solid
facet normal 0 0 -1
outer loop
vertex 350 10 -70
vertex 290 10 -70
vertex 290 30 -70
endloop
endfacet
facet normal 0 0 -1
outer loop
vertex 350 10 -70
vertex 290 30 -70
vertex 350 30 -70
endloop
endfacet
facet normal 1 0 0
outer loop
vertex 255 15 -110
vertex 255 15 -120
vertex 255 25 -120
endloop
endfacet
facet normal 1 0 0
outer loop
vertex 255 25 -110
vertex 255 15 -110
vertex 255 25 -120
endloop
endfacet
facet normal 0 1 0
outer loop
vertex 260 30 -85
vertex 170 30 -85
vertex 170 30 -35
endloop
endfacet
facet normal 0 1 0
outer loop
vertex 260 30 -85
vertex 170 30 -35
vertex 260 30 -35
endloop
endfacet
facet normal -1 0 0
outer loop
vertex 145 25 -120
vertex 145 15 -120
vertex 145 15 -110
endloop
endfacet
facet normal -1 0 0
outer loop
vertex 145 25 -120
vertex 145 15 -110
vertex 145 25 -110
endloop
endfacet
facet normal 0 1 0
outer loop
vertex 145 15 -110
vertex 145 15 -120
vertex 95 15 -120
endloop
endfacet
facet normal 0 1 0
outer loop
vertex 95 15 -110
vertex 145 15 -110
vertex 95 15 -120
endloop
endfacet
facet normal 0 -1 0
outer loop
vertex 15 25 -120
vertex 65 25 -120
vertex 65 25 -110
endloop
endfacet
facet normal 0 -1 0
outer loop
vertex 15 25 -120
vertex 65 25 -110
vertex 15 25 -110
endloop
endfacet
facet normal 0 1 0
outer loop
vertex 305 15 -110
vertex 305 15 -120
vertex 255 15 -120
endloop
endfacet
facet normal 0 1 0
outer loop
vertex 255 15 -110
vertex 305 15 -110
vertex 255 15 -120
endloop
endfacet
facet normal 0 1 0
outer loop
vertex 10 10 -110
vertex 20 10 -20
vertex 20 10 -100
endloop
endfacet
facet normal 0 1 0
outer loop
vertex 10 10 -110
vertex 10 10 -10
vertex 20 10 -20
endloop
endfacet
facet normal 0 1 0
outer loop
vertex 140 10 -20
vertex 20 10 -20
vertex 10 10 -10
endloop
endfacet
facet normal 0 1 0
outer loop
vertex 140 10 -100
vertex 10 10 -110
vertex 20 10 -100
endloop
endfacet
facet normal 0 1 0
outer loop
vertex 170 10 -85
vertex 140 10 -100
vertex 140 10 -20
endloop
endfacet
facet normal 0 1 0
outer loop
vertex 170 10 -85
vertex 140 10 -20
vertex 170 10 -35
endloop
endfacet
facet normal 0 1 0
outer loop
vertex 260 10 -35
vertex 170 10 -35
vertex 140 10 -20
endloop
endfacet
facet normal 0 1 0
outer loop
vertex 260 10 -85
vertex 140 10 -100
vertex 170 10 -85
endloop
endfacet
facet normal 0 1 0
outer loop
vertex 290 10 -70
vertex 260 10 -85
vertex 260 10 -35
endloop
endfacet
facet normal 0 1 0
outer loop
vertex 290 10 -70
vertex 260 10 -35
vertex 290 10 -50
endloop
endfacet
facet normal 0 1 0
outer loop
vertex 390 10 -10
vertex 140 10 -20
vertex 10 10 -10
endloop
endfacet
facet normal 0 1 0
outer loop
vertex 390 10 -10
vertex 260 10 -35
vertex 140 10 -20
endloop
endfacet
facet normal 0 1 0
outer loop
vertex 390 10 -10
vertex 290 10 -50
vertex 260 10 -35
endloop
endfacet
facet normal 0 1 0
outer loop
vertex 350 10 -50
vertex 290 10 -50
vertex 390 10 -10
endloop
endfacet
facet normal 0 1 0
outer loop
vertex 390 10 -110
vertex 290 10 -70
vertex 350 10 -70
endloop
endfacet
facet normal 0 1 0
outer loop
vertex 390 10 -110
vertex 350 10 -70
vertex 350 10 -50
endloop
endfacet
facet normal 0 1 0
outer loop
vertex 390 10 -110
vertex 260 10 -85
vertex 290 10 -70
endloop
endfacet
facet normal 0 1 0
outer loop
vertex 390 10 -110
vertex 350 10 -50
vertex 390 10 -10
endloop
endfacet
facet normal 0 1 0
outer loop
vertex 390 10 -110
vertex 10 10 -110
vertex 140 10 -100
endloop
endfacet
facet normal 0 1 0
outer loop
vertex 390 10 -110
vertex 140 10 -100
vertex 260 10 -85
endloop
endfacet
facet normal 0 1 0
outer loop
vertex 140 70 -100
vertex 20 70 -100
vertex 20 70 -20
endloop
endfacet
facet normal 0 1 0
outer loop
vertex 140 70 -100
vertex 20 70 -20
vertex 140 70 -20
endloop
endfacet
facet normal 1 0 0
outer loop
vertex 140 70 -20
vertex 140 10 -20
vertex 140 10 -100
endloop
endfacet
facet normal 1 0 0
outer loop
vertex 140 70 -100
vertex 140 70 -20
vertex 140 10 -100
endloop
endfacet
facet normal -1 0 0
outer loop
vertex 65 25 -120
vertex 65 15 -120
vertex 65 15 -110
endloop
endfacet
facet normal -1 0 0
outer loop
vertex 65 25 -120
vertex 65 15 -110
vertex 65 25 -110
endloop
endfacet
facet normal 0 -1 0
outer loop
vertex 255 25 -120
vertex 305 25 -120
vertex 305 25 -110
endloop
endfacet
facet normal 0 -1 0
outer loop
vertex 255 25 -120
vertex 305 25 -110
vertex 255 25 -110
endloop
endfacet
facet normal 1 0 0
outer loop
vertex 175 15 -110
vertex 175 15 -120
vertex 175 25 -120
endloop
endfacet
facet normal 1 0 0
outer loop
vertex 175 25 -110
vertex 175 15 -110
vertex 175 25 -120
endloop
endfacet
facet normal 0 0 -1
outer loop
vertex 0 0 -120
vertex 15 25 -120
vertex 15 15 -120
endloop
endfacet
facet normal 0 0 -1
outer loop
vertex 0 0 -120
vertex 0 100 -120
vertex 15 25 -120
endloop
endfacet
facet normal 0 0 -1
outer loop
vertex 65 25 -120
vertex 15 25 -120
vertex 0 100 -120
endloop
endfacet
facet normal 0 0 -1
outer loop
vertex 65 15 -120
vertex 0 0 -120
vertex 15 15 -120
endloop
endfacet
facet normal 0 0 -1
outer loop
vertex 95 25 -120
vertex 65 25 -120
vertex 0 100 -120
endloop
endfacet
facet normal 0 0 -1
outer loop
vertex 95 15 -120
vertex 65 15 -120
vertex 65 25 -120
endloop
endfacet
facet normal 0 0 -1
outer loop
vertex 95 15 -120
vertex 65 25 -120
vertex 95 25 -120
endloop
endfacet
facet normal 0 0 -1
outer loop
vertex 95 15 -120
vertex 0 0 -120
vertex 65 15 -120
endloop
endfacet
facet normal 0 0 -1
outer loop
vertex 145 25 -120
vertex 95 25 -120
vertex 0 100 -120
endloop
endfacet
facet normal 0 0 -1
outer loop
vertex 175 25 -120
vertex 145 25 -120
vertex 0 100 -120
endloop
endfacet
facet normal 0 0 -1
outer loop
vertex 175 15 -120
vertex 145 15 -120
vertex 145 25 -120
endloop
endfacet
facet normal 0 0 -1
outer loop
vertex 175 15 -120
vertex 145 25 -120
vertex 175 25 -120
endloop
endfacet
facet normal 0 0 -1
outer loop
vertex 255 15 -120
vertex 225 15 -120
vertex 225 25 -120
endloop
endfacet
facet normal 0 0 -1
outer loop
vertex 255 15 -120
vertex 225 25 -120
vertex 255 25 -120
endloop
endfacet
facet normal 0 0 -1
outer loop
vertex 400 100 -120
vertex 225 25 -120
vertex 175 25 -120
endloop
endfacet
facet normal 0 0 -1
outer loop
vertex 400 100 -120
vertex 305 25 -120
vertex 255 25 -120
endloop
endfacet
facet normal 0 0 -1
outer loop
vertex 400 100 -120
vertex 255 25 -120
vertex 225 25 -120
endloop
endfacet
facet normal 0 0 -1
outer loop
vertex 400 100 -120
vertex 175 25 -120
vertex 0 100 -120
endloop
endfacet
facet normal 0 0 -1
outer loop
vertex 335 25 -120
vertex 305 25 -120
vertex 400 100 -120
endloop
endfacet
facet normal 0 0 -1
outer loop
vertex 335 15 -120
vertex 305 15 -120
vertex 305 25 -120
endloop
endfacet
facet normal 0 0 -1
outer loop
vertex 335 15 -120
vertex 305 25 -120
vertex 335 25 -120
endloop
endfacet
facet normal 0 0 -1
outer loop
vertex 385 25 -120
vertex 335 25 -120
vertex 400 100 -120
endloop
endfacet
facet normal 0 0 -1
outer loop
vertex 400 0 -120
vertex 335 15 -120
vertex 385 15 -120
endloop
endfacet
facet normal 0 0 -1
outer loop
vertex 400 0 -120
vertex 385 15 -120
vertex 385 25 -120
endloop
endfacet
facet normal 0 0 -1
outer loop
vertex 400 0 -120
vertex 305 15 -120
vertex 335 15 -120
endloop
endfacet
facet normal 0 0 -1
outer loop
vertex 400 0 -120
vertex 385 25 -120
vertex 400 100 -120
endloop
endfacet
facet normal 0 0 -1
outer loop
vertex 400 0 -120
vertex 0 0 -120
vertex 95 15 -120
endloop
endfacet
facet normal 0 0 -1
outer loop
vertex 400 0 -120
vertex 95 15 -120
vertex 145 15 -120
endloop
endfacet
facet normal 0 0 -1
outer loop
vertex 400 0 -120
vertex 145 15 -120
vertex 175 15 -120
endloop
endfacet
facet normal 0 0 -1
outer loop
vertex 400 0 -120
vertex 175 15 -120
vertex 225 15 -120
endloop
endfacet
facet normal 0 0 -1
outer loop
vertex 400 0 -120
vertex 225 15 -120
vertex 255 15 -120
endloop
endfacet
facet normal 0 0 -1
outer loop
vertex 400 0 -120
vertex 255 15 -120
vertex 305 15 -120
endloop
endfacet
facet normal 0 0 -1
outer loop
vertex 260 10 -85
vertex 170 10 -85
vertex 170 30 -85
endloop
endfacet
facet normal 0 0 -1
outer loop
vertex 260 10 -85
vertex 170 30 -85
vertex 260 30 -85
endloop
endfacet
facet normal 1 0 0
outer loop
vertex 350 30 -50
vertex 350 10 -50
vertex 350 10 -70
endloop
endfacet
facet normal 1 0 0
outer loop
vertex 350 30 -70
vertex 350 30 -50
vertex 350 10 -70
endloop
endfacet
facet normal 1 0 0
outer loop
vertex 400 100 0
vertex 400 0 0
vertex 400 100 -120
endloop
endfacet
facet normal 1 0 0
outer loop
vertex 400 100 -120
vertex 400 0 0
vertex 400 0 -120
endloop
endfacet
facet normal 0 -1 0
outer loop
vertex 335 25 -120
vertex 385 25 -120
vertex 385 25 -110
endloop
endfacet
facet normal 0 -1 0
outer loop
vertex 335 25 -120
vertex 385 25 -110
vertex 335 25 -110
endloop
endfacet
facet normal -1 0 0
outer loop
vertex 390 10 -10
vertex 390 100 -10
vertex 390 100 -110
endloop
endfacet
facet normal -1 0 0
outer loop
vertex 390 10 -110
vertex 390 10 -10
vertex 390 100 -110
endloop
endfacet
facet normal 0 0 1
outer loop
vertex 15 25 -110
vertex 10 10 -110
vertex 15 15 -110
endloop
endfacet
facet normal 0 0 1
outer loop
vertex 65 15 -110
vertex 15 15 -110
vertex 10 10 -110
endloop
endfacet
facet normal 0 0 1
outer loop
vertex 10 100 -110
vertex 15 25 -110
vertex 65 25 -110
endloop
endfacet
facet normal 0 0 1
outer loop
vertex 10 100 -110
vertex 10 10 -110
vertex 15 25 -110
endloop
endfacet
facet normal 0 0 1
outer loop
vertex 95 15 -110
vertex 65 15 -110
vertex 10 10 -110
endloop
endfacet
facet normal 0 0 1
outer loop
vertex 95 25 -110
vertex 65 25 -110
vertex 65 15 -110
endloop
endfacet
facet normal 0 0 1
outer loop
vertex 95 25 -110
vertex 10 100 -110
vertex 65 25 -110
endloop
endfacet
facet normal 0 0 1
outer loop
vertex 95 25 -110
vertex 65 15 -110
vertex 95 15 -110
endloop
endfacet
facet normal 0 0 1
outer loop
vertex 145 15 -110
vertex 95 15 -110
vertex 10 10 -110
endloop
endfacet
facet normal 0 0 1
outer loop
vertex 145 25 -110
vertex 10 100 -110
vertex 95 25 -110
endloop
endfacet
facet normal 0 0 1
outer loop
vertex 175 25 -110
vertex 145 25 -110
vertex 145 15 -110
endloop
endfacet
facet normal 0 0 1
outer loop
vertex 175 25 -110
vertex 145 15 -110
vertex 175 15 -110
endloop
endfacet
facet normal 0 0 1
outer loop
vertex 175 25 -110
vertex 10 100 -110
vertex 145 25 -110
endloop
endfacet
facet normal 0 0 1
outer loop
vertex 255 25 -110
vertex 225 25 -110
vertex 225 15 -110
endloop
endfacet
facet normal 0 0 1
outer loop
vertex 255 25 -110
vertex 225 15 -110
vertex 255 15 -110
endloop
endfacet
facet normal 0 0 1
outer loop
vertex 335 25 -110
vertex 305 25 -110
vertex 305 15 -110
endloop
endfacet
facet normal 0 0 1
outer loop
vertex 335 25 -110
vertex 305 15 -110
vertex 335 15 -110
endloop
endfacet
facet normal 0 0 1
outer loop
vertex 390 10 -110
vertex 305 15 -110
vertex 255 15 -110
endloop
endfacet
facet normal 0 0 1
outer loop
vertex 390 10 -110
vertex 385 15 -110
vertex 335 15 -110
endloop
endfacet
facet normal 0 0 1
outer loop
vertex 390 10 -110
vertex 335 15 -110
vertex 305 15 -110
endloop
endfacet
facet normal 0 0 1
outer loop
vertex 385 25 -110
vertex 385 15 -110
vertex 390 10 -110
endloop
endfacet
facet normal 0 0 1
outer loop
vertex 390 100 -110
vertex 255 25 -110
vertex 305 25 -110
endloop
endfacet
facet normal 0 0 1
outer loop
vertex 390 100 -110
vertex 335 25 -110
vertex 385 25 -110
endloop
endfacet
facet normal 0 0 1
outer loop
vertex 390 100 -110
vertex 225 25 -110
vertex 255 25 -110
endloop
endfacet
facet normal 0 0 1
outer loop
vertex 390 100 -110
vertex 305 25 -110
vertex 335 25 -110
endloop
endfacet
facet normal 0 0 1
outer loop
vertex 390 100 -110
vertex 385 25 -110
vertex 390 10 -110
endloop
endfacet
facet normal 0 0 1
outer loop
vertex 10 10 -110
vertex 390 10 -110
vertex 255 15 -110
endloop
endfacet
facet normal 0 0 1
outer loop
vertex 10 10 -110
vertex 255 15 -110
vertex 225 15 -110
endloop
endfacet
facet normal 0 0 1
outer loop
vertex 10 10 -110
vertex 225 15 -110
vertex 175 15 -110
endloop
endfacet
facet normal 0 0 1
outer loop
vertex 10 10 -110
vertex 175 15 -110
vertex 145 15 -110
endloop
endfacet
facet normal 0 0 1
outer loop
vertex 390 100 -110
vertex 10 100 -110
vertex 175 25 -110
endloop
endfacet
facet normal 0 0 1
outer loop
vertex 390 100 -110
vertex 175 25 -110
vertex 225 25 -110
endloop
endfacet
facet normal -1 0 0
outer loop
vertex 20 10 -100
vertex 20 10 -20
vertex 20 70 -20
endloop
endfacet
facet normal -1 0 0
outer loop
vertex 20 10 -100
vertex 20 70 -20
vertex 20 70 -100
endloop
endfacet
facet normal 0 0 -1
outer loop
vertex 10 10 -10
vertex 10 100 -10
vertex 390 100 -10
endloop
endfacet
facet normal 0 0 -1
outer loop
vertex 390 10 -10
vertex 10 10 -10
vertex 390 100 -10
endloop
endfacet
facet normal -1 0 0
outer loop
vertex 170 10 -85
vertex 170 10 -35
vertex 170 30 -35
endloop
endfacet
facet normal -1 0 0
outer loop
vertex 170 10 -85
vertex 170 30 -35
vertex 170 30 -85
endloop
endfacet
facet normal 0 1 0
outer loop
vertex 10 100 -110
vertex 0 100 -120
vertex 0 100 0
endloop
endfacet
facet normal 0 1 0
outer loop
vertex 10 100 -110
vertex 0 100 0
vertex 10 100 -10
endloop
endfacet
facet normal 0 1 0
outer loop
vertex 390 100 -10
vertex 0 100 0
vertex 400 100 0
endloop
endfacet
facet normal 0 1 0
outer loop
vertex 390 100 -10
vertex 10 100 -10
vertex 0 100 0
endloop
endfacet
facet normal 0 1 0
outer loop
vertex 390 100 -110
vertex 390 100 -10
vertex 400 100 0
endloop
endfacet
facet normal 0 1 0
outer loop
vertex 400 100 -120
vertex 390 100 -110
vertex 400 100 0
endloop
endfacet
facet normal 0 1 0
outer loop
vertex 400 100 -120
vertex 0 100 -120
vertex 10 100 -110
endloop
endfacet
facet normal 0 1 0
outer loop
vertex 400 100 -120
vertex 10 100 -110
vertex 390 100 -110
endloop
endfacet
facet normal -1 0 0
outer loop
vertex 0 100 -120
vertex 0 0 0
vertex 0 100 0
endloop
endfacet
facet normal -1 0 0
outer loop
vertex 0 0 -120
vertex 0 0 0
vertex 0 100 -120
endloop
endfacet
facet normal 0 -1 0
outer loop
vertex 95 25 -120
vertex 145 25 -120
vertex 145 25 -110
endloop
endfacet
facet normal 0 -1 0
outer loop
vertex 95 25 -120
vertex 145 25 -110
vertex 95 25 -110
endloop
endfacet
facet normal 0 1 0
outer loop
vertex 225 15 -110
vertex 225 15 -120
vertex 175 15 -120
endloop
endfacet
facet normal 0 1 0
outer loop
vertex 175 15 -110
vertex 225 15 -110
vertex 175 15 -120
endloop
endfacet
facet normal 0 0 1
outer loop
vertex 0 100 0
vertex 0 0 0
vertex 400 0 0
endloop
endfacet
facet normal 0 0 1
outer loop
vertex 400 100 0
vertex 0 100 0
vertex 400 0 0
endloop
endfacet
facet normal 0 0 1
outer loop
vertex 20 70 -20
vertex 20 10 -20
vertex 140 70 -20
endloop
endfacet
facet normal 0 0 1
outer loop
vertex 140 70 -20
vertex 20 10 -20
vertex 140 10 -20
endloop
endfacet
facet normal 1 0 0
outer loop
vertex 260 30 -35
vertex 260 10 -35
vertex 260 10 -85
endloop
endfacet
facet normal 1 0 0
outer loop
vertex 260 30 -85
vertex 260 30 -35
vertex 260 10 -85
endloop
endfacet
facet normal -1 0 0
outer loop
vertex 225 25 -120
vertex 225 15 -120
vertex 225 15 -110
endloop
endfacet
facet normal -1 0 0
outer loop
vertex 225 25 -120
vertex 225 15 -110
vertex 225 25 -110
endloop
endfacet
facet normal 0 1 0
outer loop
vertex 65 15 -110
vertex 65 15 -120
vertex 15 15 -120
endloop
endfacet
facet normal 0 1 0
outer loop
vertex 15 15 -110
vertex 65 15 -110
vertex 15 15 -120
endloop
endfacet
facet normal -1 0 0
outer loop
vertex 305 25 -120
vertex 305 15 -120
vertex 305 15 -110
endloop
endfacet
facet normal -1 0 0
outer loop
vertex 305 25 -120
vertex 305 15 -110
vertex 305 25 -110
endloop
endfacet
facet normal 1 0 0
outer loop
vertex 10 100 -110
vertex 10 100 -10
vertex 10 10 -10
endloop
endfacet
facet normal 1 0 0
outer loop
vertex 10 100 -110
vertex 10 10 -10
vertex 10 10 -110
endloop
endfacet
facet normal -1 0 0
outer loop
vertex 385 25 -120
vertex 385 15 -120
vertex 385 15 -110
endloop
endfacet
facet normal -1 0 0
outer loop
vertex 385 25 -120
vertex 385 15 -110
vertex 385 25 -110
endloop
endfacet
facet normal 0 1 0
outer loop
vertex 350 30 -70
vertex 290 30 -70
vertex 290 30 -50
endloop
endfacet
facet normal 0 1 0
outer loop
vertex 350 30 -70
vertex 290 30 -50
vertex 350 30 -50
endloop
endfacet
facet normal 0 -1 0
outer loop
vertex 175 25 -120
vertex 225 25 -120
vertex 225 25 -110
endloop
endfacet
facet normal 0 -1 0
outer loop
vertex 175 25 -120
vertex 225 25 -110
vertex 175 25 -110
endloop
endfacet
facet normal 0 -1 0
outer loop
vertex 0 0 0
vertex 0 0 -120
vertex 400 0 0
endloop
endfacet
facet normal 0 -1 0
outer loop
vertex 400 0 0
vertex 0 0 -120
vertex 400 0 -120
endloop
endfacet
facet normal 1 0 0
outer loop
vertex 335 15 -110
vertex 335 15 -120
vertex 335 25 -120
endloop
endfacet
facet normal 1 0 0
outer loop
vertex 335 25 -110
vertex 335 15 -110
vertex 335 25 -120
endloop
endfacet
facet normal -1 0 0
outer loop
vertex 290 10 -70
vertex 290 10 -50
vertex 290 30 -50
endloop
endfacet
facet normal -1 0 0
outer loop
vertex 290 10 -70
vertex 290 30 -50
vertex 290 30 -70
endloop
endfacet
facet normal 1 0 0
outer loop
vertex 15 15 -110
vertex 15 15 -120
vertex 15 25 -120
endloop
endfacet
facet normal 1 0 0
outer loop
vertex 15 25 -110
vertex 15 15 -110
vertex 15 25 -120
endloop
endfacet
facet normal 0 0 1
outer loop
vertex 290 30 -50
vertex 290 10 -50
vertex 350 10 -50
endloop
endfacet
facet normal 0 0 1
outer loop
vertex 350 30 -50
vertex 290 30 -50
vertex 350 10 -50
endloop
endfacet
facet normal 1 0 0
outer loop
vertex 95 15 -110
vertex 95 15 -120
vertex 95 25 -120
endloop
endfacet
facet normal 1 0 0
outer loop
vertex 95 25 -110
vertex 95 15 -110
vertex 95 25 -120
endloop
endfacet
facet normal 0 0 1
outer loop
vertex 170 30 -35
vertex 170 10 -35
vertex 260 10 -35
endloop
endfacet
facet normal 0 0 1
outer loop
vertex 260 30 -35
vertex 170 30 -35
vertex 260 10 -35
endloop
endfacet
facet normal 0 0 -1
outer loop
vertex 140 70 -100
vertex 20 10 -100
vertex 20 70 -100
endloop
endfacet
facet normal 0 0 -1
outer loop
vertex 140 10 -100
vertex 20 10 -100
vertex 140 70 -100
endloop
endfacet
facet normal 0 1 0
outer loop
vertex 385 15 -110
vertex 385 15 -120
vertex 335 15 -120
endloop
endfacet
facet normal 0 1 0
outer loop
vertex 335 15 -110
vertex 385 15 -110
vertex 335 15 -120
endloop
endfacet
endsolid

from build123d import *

# Parameters (mm, degrees)
ESQUISSE1_W                = 400
ESQUISSE1_H                = 120
BOSS_EXTRU_1_DEPTH         = 100
ESQUISSE2_W                = 380
ESQUISSE2_H                = 100
ENL_V_MAT_EXTRU_1_DEPTH    = 90
ESQUISSE3_W                = 120
ESQUISSE3_H                = 80
BOSS_EXTRU_2_DEPTH         = 60
ESQUISSE4_W                = 90
ESQUISSE4_H                = 50
BOSS_EXTRU_3_DEPTH         = 20
ESQUISSE5_W                = 60
ESQUISSE5_H                = 20
BOSS_EXTRU_4_DEPTH         = 20
ESQUISSE9_W                = 50
ESQUISSE9_H                = 10
ENL_V_MAT_EXTRU_3_DEPTH    = 10
R_P_TITION_LIN_AIRE1_COUNT = 5
R_P_TITION_LIN_AIRE1_PITCH = 80


with BuildPart() as part:
    # Esquisse1 → Boss.-Extru.1 (new body)
    with BuildSketch(Plane(origin=(0, 0, 0), x_dir=(1, 0, 0), z_dir=(0, 1, 0))):
        with Locations((200, 60)):
            Rectangle(ESQUISSE1_W, ESQUISSE1_H)
    extrude(amount=BOSS_EXTRU_1_DEPTH)

    # Esquisse2 → Enlèv. mat.-Extru.1 (cut)
    with BuildSketch(Plane(origin=(0, 100, 0), x_dir=(1, 0, 0), z_dir=(0, 1, 0))):
        with Locations((200, 60)):
            Rectangle(ESQUISSE2_W, ESQUISSE2_H)
    extrude(amount=-ENL_V_MAT_EXTRU_1_DEPTH, mode=Mode.SUBTRACT)

    # Esquisse3 → Boss.-Extru.2 (add)
    with BuildSketch(Plane(origin=(0, 10, 0), x_dir=(1, 0, 0), z_dir=(0, 1, 0))):
        with Locations((80, 60)):
            Rectangle(ESQUISSE3_W, ESQUISSE3_H)
    extrude(amount=BOSS_EXTRU_2_DEPTH)

    # Esquisse4 → Boss.-Extru.3 (add)
    with BuildSketch(Plane(origin=(0, 10, 0), x_dir=(1, 0, 0), z_dir=(0, 1, 0))):
        with Locations((215, 60)):
            Rectangle(ESQUISSE4_W, ESQUISSE4_H)
    extrude(amount=BOSS_EXTRU_3_DEPTH)

    # Esquisse5 → Boss.-Extru.4 (add)
    with BuildSketch(Plane(origin=(0, 10, 0), x_dir=(1, 0, 0), z_dir=(0, 1, 0))):
        with Locations((320, 60)):
            Rectangle(ESQUISSE5_W, ESQUISSE5_H)
    extrude(amount=BOSS_EXTRU_4_DEPTH)

    # Esquisse9 → Enlèv. mat.-Extru.3 (cut)
    with BuildSketch(Plane(origin=(0, 0, -120), x_dir=(-1, 0, 0), z_dir=(0, 0, -1))):
        with Locations((-360, 20)):
            Rectangle(ESQUISSE9_W, ESQUISSE9_H)
    enl_v_mat_extru_3 = extrude(amount=-ENL_V_MAT_EXTRU_3_DEPTH, mode=Mode.SUBTRACT)

    # Répétition linéaire1: Enlèv. mat.-Extru.3 ×5
    with Locations(*[(-i * R_P_TITION_LIN_AIRE1_PITCH, 0, 0) for i in range(1, R_P_TITION_LIN_AIRE1_COUNT)]):
        add(enl_v_mat_extru_3, mode=Mode.SUBTRACT)


solid = part.part
